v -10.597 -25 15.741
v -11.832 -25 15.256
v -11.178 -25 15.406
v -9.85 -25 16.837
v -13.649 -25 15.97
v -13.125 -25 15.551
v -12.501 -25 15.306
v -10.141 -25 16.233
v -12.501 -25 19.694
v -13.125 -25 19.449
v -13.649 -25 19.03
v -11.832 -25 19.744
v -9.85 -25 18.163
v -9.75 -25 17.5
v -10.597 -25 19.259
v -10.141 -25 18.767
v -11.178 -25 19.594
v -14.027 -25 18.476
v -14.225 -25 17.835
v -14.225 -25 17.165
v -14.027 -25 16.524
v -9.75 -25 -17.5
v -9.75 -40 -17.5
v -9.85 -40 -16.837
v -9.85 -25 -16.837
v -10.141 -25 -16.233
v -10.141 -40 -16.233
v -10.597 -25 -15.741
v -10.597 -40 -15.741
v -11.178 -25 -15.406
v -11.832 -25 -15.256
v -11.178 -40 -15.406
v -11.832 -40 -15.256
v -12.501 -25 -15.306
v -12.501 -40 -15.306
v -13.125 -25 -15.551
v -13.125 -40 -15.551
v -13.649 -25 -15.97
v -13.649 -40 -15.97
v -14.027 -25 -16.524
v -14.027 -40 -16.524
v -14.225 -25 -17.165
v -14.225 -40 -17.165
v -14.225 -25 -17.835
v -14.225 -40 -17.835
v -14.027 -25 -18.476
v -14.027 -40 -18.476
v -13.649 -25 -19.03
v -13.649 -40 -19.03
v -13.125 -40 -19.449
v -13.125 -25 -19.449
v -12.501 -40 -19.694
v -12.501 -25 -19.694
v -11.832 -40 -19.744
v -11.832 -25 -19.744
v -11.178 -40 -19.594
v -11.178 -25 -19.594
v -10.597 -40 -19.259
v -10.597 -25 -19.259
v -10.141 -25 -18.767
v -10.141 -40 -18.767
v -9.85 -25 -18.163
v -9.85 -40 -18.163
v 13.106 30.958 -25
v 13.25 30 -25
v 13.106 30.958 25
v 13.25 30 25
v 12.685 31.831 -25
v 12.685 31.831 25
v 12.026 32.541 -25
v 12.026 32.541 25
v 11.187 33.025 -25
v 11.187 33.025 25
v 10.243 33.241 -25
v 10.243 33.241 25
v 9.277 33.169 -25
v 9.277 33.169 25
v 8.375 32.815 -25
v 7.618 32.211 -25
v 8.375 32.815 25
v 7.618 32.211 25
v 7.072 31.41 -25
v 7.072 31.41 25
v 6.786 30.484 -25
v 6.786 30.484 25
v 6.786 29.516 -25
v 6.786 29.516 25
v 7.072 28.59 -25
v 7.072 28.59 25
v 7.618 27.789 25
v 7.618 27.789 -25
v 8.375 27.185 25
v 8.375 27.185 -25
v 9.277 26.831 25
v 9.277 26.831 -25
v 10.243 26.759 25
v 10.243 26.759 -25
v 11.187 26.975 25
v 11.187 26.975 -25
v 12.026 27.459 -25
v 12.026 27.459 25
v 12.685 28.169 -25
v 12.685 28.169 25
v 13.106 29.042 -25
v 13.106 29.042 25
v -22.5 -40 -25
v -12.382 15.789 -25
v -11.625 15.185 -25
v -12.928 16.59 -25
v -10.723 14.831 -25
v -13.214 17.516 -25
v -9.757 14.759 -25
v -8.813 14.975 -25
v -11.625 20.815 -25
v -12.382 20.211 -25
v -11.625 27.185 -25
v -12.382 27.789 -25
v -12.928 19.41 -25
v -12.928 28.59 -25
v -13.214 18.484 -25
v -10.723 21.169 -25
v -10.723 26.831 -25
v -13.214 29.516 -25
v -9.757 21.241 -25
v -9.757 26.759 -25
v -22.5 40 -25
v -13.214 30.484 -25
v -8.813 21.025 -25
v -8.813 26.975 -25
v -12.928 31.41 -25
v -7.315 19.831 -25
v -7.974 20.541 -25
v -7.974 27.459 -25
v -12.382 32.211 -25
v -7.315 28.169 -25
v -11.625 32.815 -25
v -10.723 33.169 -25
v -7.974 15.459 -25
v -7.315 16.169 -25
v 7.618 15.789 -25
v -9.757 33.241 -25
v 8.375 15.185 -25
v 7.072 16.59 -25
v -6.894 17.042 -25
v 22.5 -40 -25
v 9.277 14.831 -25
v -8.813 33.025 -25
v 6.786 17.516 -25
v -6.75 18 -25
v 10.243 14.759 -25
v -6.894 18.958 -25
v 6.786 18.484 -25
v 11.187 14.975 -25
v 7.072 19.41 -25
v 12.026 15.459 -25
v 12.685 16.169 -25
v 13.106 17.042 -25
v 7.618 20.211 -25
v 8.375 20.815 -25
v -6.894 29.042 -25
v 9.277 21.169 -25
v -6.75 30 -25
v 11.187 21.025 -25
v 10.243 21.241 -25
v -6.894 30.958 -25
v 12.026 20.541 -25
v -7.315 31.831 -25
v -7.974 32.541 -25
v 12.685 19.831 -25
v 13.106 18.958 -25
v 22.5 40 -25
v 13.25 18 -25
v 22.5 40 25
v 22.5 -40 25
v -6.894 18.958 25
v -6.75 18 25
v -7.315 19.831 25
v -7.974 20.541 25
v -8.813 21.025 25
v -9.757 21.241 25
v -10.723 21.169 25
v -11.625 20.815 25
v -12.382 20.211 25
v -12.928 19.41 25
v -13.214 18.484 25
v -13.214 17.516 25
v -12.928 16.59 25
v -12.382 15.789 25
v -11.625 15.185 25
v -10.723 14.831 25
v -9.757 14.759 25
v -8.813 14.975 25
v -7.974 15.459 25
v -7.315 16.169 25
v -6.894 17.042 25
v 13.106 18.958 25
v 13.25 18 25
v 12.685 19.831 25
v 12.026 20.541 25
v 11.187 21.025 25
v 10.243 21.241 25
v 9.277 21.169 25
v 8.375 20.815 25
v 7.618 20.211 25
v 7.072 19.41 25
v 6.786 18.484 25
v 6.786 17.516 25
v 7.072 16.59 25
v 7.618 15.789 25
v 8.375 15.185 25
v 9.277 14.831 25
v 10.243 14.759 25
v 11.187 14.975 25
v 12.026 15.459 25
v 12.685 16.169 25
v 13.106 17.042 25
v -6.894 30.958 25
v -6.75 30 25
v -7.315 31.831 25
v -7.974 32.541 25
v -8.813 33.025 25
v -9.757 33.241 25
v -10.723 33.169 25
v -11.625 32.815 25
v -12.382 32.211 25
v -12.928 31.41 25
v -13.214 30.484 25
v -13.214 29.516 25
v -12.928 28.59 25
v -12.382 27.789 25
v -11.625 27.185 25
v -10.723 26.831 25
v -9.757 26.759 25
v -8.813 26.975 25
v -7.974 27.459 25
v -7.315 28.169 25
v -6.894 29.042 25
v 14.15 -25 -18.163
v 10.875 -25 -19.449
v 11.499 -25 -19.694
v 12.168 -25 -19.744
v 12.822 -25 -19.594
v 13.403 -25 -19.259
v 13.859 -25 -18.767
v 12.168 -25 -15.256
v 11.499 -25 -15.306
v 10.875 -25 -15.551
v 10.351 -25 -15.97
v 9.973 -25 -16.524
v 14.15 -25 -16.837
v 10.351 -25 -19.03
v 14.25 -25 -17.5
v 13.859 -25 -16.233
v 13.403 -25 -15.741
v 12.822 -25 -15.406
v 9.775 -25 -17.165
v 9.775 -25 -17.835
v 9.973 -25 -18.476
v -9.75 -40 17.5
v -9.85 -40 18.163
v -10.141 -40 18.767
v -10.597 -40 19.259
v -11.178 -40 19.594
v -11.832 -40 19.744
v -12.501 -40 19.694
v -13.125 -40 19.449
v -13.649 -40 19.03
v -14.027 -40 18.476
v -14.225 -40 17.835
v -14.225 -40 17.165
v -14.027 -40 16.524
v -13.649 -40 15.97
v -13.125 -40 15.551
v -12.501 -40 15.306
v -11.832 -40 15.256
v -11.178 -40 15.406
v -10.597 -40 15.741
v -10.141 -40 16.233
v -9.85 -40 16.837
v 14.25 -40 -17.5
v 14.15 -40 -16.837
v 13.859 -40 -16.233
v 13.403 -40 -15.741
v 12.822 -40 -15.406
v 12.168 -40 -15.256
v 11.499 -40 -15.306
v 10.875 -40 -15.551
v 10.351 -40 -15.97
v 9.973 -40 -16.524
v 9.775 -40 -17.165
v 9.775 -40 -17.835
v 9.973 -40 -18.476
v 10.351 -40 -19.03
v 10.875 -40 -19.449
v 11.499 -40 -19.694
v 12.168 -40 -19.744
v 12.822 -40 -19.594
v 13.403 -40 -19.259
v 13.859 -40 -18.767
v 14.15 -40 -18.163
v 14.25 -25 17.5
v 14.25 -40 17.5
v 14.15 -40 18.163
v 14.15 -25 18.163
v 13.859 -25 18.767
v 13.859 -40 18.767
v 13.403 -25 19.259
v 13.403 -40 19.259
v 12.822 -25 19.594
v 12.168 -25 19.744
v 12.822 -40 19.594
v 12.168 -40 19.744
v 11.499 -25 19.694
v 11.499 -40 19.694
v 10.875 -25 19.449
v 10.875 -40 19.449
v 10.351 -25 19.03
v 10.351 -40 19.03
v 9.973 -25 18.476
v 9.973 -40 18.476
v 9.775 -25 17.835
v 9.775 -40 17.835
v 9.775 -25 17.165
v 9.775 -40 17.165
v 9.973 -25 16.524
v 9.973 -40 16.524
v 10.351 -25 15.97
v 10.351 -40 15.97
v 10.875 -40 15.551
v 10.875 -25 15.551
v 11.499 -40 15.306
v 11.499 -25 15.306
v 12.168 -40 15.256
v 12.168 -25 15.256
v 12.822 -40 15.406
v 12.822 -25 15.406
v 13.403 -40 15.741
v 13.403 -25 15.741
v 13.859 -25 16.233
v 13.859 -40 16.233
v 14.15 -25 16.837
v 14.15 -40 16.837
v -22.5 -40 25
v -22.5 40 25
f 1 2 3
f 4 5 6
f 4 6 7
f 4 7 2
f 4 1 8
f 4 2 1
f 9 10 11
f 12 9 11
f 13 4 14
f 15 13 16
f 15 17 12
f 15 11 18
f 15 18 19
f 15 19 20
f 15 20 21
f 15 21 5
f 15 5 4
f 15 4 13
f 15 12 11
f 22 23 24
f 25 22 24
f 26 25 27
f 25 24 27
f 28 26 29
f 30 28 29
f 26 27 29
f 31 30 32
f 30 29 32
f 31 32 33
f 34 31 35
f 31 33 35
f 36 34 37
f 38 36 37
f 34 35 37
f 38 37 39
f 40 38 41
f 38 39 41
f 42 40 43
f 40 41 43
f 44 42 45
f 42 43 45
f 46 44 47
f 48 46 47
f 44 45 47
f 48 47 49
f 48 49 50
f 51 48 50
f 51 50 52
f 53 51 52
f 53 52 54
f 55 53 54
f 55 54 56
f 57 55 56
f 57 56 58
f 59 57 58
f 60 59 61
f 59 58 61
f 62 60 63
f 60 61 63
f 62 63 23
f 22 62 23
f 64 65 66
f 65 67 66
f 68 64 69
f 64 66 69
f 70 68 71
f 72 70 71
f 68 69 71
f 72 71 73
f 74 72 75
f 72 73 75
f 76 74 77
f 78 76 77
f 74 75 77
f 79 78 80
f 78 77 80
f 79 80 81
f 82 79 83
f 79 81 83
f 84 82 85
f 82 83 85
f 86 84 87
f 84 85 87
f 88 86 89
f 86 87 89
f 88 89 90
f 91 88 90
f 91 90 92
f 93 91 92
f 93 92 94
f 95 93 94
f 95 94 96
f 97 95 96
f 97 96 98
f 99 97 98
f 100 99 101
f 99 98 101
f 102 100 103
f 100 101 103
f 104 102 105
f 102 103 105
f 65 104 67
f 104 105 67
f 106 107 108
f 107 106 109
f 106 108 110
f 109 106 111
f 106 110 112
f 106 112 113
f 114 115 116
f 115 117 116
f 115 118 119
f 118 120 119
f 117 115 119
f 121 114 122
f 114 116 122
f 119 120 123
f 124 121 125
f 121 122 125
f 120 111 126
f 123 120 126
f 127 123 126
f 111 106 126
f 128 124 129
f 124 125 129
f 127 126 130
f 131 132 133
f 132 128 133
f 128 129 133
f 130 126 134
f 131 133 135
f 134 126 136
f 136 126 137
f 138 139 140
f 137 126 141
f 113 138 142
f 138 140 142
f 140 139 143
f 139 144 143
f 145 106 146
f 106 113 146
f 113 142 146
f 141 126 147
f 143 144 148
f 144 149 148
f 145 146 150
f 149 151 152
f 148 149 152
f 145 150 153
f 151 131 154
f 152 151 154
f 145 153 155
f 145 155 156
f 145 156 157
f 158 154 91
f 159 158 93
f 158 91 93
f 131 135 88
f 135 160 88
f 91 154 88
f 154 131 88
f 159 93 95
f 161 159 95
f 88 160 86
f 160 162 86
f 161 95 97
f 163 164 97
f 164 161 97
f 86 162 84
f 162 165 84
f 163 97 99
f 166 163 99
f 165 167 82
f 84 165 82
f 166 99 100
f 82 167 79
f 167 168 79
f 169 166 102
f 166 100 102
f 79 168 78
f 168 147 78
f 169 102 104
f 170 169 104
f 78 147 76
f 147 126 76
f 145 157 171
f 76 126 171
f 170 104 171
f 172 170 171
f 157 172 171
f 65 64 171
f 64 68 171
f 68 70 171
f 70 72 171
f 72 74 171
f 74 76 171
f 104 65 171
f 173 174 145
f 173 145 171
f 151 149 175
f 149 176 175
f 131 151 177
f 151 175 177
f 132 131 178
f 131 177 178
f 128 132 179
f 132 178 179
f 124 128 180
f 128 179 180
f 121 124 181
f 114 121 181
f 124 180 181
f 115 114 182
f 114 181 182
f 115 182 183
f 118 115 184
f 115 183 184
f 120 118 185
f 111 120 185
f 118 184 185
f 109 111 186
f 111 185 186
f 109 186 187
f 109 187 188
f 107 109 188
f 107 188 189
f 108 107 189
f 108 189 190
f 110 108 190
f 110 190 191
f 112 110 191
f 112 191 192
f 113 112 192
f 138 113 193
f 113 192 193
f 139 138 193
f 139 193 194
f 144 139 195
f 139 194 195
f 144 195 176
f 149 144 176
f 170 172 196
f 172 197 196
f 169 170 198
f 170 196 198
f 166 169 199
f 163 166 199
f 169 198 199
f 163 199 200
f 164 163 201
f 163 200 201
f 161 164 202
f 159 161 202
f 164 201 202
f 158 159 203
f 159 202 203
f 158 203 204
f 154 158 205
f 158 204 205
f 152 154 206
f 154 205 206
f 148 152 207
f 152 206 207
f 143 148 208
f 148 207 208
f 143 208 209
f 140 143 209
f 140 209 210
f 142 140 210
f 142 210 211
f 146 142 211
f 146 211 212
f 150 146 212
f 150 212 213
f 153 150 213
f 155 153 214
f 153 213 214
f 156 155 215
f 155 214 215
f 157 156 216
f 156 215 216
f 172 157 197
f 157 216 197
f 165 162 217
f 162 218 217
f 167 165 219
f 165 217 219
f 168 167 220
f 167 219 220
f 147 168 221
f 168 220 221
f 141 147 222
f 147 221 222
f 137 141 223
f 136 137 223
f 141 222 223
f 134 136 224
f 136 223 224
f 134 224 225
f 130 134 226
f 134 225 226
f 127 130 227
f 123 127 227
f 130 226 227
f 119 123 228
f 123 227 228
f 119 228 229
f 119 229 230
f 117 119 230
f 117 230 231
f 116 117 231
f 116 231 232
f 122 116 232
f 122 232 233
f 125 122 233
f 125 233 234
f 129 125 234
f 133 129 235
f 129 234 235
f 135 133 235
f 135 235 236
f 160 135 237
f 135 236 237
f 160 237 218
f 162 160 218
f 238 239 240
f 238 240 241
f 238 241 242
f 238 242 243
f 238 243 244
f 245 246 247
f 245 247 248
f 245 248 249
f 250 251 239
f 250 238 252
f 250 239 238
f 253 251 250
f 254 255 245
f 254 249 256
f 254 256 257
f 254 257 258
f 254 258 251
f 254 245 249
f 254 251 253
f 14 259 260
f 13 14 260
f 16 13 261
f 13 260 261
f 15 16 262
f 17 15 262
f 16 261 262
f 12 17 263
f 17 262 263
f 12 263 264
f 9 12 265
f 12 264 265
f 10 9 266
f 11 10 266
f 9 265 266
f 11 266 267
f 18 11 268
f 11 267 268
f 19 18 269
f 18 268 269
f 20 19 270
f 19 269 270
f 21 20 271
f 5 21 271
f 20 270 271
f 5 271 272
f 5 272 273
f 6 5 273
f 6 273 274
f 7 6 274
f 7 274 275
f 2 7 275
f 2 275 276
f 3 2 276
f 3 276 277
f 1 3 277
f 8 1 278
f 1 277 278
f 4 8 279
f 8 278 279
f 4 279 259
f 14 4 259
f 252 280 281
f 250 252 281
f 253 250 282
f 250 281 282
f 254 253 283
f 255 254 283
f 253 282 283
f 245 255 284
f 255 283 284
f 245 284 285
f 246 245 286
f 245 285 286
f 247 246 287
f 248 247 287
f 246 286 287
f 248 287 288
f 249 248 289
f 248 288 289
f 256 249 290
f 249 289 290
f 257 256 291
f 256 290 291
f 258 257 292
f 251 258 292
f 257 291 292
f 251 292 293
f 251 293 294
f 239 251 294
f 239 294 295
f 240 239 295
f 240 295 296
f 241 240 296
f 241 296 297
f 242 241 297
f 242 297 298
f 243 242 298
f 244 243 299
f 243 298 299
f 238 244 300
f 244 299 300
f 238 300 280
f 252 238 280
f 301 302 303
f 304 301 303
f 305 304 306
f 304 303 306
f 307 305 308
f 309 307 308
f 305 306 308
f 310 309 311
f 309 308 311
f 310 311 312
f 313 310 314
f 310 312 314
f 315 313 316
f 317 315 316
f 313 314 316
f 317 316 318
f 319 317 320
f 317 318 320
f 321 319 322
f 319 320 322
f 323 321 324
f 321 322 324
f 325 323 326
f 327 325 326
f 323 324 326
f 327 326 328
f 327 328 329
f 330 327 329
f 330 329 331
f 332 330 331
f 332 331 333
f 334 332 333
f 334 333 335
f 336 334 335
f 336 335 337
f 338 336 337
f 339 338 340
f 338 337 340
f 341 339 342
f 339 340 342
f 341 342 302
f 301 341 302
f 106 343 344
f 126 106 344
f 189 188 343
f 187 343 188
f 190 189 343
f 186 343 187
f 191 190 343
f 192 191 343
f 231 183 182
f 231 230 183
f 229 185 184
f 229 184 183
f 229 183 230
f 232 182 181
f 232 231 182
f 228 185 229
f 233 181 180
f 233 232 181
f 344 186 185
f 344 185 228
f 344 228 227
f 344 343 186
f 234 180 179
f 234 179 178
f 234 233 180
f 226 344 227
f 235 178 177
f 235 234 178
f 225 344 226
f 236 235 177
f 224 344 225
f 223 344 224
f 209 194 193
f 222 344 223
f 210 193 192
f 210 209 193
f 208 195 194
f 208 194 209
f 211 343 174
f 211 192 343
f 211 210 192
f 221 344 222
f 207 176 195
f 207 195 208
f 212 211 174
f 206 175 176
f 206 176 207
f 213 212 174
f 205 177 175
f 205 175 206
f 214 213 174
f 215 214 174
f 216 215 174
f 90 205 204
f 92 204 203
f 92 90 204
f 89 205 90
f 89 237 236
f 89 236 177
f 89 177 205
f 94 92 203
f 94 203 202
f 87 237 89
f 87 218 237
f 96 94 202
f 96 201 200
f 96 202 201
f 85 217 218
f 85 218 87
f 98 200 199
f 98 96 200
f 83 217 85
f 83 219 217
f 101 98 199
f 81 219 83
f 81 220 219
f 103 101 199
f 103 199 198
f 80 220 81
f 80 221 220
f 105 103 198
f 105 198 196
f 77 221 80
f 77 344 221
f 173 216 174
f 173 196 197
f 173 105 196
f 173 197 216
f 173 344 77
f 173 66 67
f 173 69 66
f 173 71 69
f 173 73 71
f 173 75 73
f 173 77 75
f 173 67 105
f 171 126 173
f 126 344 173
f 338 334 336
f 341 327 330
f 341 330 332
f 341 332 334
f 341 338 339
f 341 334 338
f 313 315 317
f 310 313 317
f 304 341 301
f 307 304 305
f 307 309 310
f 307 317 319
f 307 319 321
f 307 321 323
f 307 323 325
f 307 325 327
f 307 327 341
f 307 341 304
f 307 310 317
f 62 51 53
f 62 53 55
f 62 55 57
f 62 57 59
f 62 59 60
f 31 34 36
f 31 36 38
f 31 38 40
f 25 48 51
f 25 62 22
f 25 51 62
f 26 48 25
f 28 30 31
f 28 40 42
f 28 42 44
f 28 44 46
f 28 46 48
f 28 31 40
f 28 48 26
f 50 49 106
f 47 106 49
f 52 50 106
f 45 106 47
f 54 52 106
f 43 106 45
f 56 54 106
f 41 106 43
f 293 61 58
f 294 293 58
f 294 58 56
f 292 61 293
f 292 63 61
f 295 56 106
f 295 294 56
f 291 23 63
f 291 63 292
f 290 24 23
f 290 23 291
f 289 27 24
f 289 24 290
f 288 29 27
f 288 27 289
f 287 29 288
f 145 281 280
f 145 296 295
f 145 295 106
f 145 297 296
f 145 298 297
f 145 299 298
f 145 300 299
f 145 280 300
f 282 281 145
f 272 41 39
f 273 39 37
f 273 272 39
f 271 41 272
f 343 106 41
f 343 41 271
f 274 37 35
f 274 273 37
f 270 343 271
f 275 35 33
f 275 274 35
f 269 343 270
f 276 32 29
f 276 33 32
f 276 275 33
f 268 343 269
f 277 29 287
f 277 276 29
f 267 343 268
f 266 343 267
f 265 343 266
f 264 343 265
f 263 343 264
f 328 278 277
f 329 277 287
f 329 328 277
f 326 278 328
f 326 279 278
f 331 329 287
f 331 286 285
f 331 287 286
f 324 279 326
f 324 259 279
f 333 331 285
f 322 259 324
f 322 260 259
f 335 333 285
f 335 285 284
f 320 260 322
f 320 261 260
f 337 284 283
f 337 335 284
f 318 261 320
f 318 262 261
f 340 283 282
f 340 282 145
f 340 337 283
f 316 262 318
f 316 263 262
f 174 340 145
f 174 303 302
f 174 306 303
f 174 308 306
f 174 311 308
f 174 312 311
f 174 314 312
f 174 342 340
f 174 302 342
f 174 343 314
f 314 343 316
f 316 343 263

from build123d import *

# Parameters (mm, degrees)
SKETCH1_W           = 45
SKETCH1_H           = 80
BOSS_EXTRUDE1_DEPTH = 25
SKETCH3_R           = 3.25
CUT_EXTRUDE1_DEPTH  = 26
LPATTERN1_COUNT     = 2
LPATTERN1_PITCH     = 12
SKETCH4_R           = 2.25
CUT_EXTRUDE2_DEPTH  = 15


with BuildPart() as part:
    # Sketch1 → Boss-Extrude1 (new body, symmetric)
    with BuildSketch(Plane.XY):
        Rectangle(SKETCH1_W, SKETCH1_H)
    extrude(amount=BOSS_EXTRUDE1_DEPTH, both=True)

    # Sketch3 → Cut-Extrude1 (cut, symmetric)
    with BuildSketch(Plane.XY):
        with Locations((-10, 30)):
            Circle(SKETCH3_R)
        with Locations((10, 30)):
            Circle(SKETCH3_R)
    cut_extrude1 = extrude(amount=CUT_EXTRUDE1_DEPTH, both=True, mode=Mode.SUBTRACT)

    # LPattern1: Cut-Extrude1 ×2
    with Locations(*[(0, -i * LPATTERN1_PITCH, 0) for i in range(1, LPATTERN1_COUNT)]):
        add(cut_extrude1, mode=Mode.SUBTRACT)

    # Sketch4 → Cut-Extrude2 (cut)
    with BuildSketch(Plane.XZ.offset(40)):
        with Locations((-12, 17.5)):
            Circle(SKETCH4_R)
        with Locations((12, 17.5)):
            Circle(SKETCH4_R)
        with Locations((-12, -17.5)):
            Circle(SKETCH4_R)
        with Locations((12, -17.5)):
            Circle(SKETCH4_R)
    extrude(amount=-CUT_EXTRUDE2_DEPTH, mode=Mode.SUBTRACT)


solid = part.part
